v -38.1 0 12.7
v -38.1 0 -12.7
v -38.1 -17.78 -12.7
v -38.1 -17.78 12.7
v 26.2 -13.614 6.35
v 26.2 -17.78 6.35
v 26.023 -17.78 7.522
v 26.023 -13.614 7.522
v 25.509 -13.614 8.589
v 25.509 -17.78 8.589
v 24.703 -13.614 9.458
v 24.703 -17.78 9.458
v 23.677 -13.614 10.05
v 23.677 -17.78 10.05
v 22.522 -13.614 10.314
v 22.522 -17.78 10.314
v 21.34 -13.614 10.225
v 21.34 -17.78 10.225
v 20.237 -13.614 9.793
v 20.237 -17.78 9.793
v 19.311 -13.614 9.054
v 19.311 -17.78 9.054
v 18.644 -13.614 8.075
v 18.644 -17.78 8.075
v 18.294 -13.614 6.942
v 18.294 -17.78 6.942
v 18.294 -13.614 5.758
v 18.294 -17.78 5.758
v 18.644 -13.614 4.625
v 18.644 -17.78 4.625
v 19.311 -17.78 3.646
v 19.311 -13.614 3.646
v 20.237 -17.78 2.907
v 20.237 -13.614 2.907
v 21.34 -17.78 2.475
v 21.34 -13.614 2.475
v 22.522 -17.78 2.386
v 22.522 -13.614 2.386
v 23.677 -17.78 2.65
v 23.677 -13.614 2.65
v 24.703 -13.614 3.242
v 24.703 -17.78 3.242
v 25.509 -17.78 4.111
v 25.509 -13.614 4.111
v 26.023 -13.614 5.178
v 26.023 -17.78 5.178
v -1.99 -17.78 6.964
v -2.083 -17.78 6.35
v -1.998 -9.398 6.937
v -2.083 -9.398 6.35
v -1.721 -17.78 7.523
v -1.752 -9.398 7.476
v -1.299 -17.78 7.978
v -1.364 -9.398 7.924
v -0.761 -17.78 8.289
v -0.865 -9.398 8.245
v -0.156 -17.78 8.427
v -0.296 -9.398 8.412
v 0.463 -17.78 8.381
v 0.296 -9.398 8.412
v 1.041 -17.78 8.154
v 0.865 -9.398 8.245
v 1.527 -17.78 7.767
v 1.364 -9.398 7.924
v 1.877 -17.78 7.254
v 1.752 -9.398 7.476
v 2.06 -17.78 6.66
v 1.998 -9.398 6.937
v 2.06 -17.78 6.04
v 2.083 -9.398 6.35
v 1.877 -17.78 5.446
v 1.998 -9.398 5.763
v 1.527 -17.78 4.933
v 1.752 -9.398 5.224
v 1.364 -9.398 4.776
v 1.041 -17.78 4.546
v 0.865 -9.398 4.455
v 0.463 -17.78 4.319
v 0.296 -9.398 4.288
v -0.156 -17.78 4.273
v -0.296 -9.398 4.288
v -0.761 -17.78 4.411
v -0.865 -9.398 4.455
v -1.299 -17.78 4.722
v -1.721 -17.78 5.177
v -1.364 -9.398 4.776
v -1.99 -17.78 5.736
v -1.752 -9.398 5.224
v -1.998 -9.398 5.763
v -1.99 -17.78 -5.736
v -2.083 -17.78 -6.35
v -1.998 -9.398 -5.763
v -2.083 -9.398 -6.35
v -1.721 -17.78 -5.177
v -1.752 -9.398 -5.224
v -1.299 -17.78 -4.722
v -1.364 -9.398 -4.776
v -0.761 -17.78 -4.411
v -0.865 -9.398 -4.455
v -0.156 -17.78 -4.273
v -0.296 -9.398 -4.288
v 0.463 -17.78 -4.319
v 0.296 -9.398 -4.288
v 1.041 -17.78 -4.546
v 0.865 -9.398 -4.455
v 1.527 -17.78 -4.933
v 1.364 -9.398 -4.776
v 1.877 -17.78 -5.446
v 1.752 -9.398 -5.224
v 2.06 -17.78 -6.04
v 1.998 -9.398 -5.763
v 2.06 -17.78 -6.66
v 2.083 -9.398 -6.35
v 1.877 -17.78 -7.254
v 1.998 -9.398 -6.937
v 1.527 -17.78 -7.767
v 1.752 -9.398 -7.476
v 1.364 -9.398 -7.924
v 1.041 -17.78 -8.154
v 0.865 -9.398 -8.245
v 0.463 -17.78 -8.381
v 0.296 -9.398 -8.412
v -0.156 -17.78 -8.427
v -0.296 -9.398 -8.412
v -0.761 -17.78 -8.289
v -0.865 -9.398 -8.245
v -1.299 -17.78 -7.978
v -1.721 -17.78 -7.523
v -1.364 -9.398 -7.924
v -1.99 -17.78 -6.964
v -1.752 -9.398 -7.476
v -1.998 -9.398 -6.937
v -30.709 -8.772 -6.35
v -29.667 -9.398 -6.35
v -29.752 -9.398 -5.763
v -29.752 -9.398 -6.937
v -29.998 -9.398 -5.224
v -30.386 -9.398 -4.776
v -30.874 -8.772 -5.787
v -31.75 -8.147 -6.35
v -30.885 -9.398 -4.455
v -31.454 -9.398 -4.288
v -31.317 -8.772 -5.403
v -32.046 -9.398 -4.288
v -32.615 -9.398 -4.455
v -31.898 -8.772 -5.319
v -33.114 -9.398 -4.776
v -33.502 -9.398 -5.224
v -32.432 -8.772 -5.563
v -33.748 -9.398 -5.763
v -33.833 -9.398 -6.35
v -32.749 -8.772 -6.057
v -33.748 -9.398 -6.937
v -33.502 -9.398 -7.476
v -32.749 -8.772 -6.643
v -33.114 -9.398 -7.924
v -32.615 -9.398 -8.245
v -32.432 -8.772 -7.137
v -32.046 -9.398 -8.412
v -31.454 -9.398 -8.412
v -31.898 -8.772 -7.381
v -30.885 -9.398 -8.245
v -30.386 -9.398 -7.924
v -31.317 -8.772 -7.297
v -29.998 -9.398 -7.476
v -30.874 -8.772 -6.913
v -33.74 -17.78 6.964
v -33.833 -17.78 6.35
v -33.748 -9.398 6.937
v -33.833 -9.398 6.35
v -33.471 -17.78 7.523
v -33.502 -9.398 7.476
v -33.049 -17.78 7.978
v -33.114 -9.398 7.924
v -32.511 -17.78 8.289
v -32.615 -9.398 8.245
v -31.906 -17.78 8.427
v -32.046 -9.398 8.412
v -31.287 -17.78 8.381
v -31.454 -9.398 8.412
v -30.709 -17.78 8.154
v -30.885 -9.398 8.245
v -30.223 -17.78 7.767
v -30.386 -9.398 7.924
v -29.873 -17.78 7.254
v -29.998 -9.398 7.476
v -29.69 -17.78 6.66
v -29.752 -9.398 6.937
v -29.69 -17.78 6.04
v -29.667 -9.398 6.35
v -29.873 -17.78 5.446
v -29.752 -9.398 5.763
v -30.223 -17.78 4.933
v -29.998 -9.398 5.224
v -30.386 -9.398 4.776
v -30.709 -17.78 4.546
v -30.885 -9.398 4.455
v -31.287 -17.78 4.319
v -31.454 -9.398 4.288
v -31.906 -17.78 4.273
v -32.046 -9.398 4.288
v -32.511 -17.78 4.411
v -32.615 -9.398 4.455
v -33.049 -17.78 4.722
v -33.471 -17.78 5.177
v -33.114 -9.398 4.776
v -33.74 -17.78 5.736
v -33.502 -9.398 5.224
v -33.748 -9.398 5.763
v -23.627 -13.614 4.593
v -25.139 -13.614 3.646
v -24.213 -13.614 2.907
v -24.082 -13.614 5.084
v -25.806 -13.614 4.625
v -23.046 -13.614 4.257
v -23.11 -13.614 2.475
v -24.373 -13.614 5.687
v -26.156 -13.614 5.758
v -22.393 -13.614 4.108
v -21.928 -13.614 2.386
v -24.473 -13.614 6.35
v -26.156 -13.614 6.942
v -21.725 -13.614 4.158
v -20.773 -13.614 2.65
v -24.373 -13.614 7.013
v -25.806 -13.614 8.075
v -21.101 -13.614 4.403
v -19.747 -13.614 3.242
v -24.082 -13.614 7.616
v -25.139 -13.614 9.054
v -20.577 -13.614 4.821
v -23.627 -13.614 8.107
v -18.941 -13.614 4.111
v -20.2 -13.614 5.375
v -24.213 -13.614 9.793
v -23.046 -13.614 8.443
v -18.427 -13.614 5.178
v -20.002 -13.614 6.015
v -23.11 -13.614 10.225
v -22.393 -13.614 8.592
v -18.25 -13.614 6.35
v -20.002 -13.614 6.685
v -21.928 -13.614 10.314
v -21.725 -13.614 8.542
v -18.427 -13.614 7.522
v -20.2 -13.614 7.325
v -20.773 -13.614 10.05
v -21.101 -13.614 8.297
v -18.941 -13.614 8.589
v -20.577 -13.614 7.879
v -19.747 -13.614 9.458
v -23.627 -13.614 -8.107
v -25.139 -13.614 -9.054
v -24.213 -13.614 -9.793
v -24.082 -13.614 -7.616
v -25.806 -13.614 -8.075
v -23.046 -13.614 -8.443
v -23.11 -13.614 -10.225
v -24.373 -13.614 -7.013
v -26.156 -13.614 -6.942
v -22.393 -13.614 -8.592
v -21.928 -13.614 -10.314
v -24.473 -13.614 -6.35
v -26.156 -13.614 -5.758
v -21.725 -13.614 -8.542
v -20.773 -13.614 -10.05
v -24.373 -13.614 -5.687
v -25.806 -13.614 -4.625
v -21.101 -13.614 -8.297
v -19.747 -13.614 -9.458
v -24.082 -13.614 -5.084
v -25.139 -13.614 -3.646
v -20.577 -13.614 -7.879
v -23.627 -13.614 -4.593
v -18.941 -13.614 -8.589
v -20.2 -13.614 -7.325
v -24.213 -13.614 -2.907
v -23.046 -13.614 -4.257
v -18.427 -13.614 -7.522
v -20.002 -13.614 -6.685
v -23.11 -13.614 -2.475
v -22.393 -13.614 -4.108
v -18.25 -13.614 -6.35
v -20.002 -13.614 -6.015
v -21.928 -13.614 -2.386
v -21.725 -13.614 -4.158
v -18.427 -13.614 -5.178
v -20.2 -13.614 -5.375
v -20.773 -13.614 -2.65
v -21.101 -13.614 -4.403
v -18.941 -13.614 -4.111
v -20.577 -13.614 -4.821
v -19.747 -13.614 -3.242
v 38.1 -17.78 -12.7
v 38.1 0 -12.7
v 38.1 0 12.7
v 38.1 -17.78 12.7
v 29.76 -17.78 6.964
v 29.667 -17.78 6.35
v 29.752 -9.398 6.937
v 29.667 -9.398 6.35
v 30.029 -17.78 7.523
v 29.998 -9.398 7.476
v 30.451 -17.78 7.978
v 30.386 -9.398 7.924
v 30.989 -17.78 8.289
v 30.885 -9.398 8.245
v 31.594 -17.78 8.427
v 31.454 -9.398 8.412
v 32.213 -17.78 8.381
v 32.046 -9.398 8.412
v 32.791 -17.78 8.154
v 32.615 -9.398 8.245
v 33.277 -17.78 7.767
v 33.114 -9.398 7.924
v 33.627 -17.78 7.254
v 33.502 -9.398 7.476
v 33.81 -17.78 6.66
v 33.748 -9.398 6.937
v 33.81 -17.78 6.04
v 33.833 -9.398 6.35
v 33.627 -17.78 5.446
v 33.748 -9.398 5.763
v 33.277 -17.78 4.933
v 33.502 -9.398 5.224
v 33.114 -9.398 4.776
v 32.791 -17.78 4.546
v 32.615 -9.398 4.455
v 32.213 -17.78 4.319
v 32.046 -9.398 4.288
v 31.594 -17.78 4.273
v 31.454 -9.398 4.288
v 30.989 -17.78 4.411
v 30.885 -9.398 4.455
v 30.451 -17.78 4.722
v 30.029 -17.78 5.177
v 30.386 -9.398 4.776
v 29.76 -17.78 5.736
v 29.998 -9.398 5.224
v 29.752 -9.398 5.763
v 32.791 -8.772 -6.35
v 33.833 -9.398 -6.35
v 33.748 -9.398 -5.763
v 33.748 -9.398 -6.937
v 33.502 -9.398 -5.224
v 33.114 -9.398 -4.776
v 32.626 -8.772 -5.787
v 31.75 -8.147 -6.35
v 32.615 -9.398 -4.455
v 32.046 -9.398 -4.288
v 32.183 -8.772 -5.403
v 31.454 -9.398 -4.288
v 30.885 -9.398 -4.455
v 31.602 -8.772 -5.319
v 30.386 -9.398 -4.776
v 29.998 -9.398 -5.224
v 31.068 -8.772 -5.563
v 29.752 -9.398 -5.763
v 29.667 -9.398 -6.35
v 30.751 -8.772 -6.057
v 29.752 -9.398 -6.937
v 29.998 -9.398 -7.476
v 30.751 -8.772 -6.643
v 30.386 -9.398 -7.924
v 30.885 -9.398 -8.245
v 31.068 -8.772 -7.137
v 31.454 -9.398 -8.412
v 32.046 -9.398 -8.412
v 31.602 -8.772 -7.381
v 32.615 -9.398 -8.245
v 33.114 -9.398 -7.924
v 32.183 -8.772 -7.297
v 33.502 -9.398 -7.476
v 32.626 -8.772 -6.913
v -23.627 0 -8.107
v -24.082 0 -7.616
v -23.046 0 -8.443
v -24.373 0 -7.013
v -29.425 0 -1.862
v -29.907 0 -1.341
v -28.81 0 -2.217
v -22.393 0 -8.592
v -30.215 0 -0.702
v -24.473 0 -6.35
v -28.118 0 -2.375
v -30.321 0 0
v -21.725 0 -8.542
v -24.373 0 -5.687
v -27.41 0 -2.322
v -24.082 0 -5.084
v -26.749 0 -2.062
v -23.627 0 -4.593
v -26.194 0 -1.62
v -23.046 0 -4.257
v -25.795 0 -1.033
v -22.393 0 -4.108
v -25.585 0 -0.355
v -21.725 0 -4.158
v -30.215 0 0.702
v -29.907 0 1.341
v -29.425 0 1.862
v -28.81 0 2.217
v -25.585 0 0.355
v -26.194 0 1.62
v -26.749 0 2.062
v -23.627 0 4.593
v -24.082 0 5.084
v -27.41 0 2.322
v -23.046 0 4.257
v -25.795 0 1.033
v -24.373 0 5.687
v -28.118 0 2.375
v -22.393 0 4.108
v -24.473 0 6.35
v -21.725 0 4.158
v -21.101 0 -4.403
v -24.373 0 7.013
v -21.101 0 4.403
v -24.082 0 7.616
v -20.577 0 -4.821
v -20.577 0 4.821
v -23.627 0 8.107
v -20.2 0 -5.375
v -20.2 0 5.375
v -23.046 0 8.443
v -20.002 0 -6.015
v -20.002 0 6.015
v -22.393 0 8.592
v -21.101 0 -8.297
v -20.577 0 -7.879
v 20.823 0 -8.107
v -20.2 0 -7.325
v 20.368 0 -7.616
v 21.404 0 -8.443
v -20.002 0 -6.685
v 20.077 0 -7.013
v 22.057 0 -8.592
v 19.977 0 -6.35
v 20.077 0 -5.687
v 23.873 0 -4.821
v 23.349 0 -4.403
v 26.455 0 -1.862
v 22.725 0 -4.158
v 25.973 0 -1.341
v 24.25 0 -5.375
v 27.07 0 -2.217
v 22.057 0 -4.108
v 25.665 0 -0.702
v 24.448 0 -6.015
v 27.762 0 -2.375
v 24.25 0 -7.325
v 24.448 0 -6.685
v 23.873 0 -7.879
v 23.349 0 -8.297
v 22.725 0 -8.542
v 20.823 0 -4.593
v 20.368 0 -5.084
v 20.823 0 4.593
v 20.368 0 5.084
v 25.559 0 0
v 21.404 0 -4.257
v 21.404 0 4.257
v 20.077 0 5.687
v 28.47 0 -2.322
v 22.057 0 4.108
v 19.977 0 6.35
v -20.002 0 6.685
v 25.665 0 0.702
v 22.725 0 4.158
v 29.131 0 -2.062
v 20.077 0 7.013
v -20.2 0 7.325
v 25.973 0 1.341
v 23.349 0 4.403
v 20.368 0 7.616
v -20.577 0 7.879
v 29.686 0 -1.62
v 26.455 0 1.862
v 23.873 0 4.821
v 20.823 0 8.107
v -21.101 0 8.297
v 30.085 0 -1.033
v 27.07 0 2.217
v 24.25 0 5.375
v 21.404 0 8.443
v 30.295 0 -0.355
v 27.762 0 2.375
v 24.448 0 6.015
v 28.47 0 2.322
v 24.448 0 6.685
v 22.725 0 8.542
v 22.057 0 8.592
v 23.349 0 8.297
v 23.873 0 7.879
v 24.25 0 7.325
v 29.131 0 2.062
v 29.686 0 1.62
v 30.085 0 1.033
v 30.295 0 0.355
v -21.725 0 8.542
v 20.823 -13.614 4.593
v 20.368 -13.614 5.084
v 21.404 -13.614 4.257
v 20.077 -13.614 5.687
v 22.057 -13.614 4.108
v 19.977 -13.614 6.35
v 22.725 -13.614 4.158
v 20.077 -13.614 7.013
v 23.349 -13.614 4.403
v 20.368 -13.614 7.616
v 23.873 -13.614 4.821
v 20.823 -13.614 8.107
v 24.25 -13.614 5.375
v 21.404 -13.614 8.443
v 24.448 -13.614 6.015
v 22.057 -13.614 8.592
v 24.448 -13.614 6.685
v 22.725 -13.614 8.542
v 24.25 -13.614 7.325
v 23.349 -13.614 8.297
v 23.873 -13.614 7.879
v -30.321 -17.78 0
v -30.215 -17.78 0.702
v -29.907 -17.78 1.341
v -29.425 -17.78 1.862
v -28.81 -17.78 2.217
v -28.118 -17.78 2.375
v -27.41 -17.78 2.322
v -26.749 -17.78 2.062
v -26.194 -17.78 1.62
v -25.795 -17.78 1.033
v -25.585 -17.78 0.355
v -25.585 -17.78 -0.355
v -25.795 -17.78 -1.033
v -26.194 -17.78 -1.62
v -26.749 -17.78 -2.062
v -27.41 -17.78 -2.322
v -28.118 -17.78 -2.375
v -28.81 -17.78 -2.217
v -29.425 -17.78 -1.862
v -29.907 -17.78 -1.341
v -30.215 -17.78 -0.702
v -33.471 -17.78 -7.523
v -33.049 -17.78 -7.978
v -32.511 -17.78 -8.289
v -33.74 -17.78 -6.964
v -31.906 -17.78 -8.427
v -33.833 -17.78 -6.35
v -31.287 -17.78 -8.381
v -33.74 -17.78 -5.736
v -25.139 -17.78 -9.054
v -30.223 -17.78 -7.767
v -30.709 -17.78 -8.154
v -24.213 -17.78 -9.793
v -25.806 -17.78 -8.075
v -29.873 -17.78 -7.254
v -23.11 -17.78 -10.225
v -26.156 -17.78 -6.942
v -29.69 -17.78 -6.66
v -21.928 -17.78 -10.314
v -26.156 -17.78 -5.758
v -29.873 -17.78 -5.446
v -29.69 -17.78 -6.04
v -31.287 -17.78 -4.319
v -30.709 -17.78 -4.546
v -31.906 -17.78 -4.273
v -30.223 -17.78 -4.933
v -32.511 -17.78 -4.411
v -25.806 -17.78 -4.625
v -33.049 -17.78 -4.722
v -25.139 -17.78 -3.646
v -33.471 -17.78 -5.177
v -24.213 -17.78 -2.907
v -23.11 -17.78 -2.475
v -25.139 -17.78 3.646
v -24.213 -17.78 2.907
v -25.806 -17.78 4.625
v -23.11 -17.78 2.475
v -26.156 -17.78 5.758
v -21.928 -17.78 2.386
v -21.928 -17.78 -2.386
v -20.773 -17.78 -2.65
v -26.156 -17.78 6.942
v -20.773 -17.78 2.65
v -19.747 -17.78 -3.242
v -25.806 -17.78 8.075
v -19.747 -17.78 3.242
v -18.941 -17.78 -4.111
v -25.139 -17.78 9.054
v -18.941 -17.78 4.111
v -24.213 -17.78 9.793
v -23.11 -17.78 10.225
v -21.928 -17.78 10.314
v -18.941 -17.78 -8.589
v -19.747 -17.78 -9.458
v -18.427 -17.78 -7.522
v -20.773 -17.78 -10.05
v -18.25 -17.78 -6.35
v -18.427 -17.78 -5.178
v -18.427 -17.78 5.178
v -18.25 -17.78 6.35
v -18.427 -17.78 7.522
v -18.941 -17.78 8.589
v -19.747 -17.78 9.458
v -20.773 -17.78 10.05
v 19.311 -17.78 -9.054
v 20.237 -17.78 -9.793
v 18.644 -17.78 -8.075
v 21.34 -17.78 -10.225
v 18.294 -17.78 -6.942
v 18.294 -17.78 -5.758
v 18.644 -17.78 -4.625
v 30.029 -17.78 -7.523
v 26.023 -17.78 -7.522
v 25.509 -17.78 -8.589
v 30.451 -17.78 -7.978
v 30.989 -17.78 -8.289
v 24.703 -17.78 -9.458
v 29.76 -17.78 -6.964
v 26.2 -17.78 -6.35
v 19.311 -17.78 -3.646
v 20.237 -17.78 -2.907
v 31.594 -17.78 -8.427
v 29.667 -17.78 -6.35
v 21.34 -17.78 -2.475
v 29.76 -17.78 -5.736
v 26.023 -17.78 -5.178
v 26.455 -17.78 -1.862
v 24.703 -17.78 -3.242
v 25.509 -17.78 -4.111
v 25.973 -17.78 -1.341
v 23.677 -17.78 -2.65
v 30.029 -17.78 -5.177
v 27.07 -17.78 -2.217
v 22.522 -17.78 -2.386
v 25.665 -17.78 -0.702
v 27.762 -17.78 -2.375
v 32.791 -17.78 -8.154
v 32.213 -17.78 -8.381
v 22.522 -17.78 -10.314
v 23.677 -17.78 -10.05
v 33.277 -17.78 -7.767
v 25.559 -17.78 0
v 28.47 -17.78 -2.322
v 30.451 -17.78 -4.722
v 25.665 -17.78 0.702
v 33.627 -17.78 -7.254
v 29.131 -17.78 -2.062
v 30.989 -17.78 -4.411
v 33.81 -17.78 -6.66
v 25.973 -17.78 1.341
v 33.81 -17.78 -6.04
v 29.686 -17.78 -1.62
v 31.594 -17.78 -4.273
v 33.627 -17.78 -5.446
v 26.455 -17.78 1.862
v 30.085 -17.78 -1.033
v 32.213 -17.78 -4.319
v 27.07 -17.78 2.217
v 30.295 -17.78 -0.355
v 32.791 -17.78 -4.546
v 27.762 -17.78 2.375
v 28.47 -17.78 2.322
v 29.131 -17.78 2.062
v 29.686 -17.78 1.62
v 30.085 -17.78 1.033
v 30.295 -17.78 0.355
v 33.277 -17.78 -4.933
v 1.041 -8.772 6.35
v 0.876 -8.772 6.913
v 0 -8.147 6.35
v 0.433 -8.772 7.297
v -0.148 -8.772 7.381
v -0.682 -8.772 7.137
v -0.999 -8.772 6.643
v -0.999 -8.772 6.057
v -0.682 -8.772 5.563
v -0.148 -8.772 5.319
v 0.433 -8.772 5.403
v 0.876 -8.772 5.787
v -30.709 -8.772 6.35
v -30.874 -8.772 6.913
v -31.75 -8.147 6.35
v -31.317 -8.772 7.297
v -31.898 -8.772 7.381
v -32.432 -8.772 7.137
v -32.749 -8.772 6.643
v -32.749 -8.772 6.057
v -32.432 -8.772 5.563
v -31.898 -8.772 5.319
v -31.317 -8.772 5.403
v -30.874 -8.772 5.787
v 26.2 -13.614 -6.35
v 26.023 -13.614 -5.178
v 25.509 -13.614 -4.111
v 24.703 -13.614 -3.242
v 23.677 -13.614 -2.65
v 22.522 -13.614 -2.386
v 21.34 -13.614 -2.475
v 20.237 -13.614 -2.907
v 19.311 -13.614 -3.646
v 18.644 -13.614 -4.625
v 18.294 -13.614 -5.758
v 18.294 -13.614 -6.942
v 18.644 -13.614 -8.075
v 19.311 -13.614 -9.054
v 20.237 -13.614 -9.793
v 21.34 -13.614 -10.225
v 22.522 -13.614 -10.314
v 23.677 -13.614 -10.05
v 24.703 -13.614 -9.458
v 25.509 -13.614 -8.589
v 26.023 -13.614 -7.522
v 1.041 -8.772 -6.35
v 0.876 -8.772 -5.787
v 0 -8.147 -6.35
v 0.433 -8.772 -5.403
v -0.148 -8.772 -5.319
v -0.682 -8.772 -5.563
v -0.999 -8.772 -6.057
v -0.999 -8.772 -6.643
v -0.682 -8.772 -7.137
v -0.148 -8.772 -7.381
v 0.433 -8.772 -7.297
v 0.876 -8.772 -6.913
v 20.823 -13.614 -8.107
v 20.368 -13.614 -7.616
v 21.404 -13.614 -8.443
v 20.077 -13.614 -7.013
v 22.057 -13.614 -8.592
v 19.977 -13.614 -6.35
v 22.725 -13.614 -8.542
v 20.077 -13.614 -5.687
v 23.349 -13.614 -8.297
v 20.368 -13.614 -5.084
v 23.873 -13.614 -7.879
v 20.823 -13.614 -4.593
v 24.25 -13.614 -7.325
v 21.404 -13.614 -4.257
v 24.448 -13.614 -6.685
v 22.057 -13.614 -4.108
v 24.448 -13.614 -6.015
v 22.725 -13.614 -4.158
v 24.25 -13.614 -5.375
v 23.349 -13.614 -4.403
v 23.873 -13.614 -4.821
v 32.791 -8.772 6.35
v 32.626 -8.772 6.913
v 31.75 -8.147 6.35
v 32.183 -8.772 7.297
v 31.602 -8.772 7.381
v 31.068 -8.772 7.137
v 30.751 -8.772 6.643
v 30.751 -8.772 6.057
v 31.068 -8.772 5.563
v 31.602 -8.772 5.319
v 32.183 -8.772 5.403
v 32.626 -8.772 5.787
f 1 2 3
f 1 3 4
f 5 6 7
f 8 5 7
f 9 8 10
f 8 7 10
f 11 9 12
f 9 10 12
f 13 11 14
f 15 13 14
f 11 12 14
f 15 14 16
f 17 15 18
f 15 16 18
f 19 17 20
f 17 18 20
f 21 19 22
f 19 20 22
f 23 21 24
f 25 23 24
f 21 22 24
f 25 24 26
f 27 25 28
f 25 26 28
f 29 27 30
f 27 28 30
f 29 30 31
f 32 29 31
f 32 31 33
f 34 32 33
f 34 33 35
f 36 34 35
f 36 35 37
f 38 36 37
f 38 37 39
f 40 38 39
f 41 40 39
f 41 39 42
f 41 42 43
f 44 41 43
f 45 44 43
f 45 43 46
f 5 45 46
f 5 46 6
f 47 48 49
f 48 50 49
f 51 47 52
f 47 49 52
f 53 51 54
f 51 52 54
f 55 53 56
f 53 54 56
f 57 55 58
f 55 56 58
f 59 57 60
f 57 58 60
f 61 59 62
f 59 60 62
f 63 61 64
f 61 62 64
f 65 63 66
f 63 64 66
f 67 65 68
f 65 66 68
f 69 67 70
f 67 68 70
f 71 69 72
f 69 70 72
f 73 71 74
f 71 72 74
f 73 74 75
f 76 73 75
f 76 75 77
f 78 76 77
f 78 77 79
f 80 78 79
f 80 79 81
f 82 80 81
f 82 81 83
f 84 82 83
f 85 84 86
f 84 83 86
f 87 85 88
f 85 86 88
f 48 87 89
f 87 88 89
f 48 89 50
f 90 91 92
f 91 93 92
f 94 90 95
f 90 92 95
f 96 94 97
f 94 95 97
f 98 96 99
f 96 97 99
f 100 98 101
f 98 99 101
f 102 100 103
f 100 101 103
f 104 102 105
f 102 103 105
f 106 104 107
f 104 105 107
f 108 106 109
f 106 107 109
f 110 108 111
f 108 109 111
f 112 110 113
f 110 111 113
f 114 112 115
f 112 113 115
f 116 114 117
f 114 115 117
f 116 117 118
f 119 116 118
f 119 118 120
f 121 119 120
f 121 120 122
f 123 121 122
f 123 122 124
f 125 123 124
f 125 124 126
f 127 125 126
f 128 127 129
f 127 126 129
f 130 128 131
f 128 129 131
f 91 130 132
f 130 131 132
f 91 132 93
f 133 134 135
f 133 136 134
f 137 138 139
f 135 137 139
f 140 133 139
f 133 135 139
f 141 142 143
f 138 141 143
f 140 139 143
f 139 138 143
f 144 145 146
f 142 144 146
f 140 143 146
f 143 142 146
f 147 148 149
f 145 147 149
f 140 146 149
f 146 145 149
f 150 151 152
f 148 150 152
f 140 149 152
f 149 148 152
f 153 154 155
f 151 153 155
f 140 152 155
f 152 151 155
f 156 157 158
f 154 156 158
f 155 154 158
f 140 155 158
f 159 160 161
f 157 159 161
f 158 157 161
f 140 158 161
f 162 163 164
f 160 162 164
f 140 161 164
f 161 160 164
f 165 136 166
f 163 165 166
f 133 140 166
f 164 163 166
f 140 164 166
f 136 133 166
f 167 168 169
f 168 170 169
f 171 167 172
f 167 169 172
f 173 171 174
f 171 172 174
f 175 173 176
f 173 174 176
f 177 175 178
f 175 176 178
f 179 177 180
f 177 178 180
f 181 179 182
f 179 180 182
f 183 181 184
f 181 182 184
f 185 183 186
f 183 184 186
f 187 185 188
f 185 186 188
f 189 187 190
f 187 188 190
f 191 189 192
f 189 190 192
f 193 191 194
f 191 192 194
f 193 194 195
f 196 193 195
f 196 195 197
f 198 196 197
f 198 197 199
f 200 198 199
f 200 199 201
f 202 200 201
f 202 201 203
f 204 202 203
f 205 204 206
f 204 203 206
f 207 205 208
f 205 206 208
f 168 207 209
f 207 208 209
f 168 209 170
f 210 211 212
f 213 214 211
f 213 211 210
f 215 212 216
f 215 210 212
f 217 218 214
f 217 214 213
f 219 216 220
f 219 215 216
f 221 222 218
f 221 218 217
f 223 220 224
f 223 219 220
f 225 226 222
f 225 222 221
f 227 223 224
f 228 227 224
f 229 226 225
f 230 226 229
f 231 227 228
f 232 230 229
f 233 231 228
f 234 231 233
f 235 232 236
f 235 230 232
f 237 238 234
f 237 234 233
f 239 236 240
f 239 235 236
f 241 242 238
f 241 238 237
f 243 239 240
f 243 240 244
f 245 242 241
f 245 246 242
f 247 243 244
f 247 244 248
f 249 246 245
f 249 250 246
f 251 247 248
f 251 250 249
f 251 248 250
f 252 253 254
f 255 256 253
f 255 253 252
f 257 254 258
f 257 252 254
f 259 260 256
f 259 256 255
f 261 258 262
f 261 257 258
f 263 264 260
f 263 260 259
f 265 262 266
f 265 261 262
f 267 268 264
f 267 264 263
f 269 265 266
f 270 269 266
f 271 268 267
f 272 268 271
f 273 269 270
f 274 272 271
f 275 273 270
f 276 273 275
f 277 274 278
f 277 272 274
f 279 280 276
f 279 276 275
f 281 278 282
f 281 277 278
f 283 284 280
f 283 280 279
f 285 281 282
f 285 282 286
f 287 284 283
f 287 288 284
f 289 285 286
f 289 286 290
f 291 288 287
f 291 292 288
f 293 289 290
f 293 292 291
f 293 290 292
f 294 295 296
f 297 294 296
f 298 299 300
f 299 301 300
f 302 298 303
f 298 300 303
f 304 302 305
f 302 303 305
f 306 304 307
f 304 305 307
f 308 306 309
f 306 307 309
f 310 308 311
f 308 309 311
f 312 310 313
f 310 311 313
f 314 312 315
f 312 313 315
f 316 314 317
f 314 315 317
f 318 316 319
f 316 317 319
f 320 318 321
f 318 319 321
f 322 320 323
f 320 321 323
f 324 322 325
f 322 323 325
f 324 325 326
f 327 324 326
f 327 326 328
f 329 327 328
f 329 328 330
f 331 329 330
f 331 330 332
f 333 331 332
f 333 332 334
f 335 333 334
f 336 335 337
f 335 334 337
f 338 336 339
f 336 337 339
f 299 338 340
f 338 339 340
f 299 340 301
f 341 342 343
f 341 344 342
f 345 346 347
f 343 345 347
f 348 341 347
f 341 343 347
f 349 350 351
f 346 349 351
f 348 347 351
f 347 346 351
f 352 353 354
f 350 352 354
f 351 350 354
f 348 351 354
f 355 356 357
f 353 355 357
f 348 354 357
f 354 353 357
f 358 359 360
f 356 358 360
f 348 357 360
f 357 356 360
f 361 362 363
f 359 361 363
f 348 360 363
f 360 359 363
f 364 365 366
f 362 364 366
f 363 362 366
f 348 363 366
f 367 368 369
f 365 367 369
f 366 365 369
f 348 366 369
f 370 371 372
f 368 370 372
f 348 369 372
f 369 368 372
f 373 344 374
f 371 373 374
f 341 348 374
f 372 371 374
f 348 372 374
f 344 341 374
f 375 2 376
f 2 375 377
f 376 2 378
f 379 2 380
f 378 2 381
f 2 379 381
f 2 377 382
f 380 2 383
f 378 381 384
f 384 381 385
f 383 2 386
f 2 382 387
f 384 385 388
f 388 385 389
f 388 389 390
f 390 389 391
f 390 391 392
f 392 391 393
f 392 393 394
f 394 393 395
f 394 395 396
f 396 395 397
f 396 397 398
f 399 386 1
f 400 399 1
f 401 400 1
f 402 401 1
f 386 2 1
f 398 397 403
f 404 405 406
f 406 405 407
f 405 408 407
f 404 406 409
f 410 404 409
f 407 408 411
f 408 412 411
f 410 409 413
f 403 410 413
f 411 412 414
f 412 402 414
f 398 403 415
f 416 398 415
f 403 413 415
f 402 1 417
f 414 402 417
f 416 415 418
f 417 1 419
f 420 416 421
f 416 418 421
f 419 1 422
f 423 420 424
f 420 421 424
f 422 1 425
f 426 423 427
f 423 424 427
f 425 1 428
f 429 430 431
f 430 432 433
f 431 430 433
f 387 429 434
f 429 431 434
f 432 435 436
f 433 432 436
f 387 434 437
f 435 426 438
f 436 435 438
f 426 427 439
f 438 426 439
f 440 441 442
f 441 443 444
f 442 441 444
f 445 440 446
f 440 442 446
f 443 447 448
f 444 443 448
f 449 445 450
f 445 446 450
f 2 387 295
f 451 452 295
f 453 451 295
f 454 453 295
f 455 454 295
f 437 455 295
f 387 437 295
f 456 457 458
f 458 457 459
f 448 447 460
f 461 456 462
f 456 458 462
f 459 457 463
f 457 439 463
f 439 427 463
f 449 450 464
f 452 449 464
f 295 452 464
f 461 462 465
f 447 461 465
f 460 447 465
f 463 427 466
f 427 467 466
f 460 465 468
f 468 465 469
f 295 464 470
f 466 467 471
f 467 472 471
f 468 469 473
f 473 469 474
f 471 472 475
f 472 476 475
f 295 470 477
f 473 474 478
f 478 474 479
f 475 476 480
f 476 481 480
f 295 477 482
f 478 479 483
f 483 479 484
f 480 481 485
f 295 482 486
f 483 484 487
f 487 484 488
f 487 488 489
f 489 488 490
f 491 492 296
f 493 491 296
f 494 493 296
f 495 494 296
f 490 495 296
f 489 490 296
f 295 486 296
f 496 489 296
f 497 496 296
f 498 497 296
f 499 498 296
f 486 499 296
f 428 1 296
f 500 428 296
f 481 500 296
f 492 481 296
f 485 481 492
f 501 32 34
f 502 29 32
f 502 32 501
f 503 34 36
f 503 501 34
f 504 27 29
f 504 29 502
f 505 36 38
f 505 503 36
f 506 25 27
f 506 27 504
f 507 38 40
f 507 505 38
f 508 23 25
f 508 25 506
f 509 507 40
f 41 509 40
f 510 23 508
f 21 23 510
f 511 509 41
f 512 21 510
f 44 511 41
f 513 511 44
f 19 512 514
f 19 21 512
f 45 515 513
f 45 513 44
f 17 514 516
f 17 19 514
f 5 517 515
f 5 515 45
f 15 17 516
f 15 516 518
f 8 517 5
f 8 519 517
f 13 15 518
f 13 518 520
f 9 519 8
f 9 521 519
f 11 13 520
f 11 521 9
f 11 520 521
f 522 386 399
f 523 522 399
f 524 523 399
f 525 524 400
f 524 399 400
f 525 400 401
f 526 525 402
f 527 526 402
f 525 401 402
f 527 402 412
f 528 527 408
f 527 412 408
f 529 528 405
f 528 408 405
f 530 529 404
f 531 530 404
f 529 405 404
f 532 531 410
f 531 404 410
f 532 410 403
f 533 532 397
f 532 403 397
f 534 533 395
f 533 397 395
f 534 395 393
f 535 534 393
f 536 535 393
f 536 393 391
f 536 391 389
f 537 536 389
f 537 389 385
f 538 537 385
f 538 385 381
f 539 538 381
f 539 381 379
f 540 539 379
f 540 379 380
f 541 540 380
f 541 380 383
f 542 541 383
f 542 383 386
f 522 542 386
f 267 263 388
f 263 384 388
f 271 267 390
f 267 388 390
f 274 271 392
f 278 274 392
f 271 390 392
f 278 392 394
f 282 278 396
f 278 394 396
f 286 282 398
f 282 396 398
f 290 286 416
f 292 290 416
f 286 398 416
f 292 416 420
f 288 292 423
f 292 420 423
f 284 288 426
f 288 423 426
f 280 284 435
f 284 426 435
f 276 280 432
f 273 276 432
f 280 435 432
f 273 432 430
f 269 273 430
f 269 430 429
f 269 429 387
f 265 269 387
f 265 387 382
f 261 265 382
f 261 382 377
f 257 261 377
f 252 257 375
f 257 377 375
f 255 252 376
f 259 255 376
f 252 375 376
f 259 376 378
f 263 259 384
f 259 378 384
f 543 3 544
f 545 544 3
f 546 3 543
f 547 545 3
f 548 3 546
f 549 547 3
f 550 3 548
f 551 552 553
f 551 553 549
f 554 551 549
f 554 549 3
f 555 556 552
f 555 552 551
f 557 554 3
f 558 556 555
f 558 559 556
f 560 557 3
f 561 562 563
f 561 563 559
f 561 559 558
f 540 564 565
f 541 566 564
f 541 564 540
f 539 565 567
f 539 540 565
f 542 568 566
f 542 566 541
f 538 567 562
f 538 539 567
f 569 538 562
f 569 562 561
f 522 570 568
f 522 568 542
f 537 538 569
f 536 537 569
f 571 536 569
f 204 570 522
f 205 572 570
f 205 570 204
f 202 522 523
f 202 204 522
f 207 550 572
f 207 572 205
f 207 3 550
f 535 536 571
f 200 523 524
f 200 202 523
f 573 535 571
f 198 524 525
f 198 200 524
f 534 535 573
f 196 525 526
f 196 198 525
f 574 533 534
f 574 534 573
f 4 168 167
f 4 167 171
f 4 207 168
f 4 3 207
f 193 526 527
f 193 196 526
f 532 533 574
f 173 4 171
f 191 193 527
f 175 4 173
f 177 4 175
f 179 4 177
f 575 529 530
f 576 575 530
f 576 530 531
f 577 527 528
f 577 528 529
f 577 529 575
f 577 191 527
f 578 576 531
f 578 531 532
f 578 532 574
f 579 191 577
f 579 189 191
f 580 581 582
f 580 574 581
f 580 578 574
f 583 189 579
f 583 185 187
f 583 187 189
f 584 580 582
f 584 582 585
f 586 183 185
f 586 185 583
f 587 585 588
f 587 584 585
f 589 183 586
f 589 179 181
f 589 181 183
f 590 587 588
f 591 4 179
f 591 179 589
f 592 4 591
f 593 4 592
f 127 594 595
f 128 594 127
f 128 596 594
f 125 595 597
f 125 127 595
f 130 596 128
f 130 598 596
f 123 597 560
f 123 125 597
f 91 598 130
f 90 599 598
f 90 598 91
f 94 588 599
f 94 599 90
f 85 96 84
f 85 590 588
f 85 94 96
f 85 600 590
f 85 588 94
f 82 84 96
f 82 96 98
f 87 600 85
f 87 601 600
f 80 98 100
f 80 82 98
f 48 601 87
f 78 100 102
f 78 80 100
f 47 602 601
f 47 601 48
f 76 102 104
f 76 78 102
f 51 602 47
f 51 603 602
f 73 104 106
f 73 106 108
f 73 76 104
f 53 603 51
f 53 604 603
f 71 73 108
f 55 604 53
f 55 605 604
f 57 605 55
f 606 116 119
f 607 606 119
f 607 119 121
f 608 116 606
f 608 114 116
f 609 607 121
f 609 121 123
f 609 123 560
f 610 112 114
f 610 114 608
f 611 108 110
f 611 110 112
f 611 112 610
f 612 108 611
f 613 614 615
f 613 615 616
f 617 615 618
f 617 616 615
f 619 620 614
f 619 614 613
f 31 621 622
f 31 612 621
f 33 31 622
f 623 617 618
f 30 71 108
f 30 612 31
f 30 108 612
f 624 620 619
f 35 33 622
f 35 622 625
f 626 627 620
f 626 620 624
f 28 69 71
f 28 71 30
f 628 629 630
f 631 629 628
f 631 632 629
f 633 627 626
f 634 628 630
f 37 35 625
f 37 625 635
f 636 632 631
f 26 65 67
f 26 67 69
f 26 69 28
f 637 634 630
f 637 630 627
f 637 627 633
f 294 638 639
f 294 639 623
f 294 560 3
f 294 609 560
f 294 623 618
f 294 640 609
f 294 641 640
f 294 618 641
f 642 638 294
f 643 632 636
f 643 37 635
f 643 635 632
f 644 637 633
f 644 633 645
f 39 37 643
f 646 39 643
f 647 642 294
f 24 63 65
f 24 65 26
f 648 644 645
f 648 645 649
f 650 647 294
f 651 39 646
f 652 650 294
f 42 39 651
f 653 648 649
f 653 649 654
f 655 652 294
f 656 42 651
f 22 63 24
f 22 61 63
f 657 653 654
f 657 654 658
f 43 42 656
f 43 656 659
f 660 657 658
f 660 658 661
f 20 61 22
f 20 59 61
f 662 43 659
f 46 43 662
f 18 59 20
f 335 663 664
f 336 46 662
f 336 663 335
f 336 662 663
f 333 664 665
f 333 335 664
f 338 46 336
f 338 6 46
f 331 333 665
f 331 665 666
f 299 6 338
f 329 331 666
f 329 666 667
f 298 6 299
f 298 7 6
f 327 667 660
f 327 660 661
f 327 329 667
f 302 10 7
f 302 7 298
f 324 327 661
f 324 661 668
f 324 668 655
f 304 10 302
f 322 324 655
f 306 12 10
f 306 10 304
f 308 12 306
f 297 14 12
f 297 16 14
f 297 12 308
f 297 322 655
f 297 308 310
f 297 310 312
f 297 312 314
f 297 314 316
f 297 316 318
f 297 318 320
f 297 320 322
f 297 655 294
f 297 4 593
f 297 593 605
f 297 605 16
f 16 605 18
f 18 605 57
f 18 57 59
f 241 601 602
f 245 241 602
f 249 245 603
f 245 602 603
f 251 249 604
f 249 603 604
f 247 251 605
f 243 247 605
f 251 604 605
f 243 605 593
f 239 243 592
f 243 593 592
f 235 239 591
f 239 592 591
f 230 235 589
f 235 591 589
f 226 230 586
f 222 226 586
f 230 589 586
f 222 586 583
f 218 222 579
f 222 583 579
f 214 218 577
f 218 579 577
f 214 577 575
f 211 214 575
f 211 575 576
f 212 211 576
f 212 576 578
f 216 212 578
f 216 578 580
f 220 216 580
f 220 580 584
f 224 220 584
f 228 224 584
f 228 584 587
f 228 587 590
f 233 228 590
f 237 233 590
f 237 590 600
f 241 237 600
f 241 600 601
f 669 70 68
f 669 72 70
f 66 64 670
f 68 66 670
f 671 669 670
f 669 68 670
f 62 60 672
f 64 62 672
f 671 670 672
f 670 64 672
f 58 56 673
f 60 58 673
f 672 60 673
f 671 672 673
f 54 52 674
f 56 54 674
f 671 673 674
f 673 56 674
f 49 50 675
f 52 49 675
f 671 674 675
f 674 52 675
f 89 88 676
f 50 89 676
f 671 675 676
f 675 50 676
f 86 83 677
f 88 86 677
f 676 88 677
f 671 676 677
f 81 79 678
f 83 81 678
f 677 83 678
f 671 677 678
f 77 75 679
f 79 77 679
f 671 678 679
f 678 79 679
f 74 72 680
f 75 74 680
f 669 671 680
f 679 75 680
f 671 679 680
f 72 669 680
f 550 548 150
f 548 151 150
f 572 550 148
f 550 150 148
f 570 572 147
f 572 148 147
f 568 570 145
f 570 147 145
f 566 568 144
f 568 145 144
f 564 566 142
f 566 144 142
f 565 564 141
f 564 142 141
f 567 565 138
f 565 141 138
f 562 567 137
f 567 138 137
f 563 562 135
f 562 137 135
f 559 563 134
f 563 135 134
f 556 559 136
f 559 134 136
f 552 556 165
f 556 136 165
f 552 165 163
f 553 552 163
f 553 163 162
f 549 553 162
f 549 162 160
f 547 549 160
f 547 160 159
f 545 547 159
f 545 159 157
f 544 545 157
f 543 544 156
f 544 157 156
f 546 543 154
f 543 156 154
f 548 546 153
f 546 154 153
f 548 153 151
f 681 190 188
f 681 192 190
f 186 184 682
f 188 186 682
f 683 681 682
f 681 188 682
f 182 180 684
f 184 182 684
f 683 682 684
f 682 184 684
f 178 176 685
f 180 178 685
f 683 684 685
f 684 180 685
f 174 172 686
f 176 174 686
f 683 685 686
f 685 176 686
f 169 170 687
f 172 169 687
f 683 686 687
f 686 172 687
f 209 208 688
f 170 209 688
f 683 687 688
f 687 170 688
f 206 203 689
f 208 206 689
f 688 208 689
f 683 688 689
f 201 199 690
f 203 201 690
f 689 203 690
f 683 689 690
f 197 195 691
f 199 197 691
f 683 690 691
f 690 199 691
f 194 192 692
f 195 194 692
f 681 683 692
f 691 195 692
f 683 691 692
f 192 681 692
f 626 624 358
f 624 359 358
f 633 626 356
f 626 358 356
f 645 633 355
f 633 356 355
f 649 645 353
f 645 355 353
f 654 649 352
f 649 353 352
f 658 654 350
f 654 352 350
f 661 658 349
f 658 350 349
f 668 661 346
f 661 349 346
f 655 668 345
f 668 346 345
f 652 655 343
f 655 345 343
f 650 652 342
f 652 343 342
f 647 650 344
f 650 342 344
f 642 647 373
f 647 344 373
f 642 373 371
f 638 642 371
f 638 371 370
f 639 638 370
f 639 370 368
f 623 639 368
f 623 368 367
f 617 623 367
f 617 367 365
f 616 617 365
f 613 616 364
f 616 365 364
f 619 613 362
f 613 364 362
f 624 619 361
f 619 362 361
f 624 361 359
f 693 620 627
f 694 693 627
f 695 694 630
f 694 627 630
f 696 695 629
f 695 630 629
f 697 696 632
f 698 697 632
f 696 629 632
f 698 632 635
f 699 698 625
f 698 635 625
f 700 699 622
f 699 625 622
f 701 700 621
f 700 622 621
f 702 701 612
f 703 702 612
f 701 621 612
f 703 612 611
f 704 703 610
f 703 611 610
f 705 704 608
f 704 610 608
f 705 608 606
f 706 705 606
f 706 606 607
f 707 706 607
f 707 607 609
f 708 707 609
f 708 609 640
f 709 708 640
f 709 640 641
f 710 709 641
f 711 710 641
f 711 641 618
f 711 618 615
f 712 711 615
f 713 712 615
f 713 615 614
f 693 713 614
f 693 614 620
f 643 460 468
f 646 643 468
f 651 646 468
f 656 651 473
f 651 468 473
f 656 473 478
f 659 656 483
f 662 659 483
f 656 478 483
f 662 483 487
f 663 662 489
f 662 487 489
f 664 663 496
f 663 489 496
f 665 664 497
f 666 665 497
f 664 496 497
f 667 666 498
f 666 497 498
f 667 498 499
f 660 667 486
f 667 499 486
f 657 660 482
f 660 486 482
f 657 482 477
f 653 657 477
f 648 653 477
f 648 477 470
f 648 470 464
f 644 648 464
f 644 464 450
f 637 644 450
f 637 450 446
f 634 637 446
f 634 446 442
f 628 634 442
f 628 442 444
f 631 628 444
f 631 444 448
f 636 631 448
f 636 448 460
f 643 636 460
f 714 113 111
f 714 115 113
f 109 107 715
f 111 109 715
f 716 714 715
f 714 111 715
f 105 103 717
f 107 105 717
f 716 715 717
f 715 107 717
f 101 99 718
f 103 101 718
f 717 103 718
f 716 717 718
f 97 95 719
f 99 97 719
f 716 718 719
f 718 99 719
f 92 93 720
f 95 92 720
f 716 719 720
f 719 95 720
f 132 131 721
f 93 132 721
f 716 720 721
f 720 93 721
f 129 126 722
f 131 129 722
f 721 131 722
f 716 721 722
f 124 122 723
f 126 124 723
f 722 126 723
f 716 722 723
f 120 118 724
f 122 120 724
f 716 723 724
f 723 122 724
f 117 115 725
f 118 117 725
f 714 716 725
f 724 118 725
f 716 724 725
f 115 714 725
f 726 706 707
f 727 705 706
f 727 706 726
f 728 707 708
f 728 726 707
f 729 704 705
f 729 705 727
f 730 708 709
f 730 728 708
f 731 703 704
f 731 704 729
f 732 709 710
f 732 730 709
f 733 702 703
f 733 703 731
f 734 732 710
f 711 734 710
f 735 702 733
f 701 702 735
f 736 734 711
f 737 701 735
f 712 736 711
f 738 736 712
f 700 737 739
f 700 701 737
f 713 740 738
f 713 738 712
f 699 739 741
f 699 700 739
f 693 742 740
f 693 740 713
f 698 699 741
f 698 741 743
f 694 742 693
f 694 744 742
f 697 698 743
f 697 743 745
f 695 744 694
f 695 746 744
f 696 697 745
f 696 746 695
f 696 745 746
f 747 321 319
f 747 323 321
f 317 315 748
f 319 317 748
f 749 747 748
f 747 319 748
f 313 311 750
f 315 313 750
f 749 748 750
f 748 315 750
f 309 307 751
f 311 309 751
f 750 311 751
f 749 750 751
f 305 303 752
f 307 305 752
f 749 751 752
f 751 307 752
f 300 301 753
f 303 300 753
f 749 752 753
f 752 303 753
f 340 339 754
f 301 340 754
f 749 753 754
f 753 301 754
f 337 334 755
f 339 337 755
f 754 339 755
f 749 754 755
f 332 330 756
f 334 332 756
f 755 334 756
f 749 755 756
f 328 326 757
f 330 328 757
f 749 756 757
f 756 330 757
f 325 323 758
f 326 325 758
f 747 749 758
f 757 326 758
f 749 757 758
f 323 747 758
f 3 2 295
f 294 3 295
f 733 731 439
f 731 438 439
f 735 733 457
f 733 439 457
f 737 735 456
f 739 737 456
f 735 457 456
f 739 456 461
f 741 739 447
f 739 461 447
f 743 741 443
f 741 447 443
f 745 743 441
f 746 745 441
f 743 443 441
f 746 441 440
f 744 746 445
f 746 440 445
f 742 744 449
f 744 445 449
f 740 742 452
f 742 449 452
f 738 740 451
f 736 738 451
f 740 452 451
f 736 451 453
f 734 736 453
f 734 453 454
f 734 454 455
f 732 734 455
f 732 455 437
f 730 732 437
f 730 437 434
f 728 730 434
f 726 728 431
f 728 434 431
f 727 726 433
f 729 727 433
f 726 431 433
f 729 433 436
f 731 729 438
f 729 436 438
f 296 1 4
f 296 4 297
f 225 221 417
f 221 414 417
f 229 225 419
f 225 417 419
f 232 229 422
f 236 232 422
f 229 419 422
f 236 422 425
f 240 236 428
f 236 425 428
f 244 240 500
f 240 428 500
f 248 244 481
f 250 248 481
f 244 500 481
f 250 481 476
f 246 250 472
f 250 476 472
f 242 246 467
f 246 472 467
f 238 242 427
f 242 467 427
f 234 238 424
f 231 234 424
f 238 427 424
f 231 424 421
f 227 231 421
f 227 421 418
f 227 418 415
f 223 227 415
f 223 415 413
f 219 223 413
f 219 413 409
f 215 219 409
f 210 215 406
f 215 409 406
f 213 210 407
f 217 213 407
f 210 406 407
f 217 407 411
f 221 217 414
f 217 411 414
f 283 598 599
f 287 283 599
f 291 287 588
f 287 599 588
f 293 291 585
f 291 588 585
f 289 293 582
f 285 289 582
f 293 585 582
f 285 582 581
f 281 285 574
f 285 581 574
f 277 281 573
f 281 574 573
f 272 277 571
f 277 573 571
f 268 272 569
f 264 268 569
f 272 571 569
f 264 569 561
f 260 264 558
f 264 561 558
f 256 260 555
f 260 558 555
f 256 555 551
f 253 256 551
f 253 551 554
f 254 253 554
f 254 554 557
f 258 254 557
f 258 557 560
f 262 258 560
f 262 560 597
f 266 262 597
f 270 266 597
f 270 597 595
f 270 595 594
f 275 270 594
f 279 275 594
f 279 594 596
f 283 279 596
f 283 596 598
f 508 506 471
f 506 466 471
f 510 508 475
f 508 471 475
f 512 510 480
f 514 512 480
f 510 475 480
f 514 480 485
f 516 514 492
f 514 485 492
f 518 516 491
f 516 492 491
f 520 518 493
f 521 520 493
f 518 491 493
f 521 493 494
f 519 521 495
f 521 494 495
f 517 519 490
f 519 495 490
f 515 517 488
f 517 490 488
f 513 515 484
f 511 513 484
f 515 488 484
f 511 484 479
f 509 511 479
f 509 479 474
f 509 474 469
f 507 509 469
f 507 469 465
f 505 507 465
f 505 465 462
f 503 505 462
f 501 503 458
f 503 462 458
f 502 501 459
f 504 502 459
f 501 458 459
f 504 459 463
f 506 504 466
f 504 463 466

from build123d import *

# Parameters (mm, degrees)
F0_W           = 76.2
F0_H           = 25.4
F1_DEPTH       = 17.78
F3_D           = 4.1656
F3_DEPTH       = 8.382
F3_TIP         = 1.2514724973
F5_D           = 4.4958
F5_CBORE_D     = 7.9502
F5_CBORE_DEPTH = 4.1656
F7_D           = 4.7625


with BuildPart() as f1:
    # F0 (on Front) → F1 (new body)
    with BuildSketch(Plane.XZ):
        Rectangle(F0_W, F0_H)
    extrude(amount=F1_DEPTH)

    # F3
    with Locations(Plane.XZ.offset(17.78)):
        with Locations((-31.75, 6.35), (0, 6.35), (31.75, 6.35), (31.75, -6.35), (0, -6.35), (-31.75, -6.35)):
            Hole(F3_D / 2, depth=F3_DEPTH)
            with Locations((0, 0, -(F3_DEPTH + F3_TIP / 2))):  # 118° drill point
                Cone(0, F3_D / 2, F3_TIP, mode=Mode.SUBTRACT)

    # F5 (through all)
    with Locations(Plane.XZ.offset(17.78)):
        with Locations((-22.225, 6.35), (22.225, 6.35), (22.225, -6.35), (-22.225, -6.35)):
            CounterBoreHole(F5_D / 2, F5_CBORE_D / 2, F5_CBORE_DEPTH)

    # F7 (through all)
    with Locations(Plane.XZ.offset(17.78)):
        with Locations((-27.94, 0), (27.94, 0)):
            Hole(F7_D / 2)


solid = f1.part
